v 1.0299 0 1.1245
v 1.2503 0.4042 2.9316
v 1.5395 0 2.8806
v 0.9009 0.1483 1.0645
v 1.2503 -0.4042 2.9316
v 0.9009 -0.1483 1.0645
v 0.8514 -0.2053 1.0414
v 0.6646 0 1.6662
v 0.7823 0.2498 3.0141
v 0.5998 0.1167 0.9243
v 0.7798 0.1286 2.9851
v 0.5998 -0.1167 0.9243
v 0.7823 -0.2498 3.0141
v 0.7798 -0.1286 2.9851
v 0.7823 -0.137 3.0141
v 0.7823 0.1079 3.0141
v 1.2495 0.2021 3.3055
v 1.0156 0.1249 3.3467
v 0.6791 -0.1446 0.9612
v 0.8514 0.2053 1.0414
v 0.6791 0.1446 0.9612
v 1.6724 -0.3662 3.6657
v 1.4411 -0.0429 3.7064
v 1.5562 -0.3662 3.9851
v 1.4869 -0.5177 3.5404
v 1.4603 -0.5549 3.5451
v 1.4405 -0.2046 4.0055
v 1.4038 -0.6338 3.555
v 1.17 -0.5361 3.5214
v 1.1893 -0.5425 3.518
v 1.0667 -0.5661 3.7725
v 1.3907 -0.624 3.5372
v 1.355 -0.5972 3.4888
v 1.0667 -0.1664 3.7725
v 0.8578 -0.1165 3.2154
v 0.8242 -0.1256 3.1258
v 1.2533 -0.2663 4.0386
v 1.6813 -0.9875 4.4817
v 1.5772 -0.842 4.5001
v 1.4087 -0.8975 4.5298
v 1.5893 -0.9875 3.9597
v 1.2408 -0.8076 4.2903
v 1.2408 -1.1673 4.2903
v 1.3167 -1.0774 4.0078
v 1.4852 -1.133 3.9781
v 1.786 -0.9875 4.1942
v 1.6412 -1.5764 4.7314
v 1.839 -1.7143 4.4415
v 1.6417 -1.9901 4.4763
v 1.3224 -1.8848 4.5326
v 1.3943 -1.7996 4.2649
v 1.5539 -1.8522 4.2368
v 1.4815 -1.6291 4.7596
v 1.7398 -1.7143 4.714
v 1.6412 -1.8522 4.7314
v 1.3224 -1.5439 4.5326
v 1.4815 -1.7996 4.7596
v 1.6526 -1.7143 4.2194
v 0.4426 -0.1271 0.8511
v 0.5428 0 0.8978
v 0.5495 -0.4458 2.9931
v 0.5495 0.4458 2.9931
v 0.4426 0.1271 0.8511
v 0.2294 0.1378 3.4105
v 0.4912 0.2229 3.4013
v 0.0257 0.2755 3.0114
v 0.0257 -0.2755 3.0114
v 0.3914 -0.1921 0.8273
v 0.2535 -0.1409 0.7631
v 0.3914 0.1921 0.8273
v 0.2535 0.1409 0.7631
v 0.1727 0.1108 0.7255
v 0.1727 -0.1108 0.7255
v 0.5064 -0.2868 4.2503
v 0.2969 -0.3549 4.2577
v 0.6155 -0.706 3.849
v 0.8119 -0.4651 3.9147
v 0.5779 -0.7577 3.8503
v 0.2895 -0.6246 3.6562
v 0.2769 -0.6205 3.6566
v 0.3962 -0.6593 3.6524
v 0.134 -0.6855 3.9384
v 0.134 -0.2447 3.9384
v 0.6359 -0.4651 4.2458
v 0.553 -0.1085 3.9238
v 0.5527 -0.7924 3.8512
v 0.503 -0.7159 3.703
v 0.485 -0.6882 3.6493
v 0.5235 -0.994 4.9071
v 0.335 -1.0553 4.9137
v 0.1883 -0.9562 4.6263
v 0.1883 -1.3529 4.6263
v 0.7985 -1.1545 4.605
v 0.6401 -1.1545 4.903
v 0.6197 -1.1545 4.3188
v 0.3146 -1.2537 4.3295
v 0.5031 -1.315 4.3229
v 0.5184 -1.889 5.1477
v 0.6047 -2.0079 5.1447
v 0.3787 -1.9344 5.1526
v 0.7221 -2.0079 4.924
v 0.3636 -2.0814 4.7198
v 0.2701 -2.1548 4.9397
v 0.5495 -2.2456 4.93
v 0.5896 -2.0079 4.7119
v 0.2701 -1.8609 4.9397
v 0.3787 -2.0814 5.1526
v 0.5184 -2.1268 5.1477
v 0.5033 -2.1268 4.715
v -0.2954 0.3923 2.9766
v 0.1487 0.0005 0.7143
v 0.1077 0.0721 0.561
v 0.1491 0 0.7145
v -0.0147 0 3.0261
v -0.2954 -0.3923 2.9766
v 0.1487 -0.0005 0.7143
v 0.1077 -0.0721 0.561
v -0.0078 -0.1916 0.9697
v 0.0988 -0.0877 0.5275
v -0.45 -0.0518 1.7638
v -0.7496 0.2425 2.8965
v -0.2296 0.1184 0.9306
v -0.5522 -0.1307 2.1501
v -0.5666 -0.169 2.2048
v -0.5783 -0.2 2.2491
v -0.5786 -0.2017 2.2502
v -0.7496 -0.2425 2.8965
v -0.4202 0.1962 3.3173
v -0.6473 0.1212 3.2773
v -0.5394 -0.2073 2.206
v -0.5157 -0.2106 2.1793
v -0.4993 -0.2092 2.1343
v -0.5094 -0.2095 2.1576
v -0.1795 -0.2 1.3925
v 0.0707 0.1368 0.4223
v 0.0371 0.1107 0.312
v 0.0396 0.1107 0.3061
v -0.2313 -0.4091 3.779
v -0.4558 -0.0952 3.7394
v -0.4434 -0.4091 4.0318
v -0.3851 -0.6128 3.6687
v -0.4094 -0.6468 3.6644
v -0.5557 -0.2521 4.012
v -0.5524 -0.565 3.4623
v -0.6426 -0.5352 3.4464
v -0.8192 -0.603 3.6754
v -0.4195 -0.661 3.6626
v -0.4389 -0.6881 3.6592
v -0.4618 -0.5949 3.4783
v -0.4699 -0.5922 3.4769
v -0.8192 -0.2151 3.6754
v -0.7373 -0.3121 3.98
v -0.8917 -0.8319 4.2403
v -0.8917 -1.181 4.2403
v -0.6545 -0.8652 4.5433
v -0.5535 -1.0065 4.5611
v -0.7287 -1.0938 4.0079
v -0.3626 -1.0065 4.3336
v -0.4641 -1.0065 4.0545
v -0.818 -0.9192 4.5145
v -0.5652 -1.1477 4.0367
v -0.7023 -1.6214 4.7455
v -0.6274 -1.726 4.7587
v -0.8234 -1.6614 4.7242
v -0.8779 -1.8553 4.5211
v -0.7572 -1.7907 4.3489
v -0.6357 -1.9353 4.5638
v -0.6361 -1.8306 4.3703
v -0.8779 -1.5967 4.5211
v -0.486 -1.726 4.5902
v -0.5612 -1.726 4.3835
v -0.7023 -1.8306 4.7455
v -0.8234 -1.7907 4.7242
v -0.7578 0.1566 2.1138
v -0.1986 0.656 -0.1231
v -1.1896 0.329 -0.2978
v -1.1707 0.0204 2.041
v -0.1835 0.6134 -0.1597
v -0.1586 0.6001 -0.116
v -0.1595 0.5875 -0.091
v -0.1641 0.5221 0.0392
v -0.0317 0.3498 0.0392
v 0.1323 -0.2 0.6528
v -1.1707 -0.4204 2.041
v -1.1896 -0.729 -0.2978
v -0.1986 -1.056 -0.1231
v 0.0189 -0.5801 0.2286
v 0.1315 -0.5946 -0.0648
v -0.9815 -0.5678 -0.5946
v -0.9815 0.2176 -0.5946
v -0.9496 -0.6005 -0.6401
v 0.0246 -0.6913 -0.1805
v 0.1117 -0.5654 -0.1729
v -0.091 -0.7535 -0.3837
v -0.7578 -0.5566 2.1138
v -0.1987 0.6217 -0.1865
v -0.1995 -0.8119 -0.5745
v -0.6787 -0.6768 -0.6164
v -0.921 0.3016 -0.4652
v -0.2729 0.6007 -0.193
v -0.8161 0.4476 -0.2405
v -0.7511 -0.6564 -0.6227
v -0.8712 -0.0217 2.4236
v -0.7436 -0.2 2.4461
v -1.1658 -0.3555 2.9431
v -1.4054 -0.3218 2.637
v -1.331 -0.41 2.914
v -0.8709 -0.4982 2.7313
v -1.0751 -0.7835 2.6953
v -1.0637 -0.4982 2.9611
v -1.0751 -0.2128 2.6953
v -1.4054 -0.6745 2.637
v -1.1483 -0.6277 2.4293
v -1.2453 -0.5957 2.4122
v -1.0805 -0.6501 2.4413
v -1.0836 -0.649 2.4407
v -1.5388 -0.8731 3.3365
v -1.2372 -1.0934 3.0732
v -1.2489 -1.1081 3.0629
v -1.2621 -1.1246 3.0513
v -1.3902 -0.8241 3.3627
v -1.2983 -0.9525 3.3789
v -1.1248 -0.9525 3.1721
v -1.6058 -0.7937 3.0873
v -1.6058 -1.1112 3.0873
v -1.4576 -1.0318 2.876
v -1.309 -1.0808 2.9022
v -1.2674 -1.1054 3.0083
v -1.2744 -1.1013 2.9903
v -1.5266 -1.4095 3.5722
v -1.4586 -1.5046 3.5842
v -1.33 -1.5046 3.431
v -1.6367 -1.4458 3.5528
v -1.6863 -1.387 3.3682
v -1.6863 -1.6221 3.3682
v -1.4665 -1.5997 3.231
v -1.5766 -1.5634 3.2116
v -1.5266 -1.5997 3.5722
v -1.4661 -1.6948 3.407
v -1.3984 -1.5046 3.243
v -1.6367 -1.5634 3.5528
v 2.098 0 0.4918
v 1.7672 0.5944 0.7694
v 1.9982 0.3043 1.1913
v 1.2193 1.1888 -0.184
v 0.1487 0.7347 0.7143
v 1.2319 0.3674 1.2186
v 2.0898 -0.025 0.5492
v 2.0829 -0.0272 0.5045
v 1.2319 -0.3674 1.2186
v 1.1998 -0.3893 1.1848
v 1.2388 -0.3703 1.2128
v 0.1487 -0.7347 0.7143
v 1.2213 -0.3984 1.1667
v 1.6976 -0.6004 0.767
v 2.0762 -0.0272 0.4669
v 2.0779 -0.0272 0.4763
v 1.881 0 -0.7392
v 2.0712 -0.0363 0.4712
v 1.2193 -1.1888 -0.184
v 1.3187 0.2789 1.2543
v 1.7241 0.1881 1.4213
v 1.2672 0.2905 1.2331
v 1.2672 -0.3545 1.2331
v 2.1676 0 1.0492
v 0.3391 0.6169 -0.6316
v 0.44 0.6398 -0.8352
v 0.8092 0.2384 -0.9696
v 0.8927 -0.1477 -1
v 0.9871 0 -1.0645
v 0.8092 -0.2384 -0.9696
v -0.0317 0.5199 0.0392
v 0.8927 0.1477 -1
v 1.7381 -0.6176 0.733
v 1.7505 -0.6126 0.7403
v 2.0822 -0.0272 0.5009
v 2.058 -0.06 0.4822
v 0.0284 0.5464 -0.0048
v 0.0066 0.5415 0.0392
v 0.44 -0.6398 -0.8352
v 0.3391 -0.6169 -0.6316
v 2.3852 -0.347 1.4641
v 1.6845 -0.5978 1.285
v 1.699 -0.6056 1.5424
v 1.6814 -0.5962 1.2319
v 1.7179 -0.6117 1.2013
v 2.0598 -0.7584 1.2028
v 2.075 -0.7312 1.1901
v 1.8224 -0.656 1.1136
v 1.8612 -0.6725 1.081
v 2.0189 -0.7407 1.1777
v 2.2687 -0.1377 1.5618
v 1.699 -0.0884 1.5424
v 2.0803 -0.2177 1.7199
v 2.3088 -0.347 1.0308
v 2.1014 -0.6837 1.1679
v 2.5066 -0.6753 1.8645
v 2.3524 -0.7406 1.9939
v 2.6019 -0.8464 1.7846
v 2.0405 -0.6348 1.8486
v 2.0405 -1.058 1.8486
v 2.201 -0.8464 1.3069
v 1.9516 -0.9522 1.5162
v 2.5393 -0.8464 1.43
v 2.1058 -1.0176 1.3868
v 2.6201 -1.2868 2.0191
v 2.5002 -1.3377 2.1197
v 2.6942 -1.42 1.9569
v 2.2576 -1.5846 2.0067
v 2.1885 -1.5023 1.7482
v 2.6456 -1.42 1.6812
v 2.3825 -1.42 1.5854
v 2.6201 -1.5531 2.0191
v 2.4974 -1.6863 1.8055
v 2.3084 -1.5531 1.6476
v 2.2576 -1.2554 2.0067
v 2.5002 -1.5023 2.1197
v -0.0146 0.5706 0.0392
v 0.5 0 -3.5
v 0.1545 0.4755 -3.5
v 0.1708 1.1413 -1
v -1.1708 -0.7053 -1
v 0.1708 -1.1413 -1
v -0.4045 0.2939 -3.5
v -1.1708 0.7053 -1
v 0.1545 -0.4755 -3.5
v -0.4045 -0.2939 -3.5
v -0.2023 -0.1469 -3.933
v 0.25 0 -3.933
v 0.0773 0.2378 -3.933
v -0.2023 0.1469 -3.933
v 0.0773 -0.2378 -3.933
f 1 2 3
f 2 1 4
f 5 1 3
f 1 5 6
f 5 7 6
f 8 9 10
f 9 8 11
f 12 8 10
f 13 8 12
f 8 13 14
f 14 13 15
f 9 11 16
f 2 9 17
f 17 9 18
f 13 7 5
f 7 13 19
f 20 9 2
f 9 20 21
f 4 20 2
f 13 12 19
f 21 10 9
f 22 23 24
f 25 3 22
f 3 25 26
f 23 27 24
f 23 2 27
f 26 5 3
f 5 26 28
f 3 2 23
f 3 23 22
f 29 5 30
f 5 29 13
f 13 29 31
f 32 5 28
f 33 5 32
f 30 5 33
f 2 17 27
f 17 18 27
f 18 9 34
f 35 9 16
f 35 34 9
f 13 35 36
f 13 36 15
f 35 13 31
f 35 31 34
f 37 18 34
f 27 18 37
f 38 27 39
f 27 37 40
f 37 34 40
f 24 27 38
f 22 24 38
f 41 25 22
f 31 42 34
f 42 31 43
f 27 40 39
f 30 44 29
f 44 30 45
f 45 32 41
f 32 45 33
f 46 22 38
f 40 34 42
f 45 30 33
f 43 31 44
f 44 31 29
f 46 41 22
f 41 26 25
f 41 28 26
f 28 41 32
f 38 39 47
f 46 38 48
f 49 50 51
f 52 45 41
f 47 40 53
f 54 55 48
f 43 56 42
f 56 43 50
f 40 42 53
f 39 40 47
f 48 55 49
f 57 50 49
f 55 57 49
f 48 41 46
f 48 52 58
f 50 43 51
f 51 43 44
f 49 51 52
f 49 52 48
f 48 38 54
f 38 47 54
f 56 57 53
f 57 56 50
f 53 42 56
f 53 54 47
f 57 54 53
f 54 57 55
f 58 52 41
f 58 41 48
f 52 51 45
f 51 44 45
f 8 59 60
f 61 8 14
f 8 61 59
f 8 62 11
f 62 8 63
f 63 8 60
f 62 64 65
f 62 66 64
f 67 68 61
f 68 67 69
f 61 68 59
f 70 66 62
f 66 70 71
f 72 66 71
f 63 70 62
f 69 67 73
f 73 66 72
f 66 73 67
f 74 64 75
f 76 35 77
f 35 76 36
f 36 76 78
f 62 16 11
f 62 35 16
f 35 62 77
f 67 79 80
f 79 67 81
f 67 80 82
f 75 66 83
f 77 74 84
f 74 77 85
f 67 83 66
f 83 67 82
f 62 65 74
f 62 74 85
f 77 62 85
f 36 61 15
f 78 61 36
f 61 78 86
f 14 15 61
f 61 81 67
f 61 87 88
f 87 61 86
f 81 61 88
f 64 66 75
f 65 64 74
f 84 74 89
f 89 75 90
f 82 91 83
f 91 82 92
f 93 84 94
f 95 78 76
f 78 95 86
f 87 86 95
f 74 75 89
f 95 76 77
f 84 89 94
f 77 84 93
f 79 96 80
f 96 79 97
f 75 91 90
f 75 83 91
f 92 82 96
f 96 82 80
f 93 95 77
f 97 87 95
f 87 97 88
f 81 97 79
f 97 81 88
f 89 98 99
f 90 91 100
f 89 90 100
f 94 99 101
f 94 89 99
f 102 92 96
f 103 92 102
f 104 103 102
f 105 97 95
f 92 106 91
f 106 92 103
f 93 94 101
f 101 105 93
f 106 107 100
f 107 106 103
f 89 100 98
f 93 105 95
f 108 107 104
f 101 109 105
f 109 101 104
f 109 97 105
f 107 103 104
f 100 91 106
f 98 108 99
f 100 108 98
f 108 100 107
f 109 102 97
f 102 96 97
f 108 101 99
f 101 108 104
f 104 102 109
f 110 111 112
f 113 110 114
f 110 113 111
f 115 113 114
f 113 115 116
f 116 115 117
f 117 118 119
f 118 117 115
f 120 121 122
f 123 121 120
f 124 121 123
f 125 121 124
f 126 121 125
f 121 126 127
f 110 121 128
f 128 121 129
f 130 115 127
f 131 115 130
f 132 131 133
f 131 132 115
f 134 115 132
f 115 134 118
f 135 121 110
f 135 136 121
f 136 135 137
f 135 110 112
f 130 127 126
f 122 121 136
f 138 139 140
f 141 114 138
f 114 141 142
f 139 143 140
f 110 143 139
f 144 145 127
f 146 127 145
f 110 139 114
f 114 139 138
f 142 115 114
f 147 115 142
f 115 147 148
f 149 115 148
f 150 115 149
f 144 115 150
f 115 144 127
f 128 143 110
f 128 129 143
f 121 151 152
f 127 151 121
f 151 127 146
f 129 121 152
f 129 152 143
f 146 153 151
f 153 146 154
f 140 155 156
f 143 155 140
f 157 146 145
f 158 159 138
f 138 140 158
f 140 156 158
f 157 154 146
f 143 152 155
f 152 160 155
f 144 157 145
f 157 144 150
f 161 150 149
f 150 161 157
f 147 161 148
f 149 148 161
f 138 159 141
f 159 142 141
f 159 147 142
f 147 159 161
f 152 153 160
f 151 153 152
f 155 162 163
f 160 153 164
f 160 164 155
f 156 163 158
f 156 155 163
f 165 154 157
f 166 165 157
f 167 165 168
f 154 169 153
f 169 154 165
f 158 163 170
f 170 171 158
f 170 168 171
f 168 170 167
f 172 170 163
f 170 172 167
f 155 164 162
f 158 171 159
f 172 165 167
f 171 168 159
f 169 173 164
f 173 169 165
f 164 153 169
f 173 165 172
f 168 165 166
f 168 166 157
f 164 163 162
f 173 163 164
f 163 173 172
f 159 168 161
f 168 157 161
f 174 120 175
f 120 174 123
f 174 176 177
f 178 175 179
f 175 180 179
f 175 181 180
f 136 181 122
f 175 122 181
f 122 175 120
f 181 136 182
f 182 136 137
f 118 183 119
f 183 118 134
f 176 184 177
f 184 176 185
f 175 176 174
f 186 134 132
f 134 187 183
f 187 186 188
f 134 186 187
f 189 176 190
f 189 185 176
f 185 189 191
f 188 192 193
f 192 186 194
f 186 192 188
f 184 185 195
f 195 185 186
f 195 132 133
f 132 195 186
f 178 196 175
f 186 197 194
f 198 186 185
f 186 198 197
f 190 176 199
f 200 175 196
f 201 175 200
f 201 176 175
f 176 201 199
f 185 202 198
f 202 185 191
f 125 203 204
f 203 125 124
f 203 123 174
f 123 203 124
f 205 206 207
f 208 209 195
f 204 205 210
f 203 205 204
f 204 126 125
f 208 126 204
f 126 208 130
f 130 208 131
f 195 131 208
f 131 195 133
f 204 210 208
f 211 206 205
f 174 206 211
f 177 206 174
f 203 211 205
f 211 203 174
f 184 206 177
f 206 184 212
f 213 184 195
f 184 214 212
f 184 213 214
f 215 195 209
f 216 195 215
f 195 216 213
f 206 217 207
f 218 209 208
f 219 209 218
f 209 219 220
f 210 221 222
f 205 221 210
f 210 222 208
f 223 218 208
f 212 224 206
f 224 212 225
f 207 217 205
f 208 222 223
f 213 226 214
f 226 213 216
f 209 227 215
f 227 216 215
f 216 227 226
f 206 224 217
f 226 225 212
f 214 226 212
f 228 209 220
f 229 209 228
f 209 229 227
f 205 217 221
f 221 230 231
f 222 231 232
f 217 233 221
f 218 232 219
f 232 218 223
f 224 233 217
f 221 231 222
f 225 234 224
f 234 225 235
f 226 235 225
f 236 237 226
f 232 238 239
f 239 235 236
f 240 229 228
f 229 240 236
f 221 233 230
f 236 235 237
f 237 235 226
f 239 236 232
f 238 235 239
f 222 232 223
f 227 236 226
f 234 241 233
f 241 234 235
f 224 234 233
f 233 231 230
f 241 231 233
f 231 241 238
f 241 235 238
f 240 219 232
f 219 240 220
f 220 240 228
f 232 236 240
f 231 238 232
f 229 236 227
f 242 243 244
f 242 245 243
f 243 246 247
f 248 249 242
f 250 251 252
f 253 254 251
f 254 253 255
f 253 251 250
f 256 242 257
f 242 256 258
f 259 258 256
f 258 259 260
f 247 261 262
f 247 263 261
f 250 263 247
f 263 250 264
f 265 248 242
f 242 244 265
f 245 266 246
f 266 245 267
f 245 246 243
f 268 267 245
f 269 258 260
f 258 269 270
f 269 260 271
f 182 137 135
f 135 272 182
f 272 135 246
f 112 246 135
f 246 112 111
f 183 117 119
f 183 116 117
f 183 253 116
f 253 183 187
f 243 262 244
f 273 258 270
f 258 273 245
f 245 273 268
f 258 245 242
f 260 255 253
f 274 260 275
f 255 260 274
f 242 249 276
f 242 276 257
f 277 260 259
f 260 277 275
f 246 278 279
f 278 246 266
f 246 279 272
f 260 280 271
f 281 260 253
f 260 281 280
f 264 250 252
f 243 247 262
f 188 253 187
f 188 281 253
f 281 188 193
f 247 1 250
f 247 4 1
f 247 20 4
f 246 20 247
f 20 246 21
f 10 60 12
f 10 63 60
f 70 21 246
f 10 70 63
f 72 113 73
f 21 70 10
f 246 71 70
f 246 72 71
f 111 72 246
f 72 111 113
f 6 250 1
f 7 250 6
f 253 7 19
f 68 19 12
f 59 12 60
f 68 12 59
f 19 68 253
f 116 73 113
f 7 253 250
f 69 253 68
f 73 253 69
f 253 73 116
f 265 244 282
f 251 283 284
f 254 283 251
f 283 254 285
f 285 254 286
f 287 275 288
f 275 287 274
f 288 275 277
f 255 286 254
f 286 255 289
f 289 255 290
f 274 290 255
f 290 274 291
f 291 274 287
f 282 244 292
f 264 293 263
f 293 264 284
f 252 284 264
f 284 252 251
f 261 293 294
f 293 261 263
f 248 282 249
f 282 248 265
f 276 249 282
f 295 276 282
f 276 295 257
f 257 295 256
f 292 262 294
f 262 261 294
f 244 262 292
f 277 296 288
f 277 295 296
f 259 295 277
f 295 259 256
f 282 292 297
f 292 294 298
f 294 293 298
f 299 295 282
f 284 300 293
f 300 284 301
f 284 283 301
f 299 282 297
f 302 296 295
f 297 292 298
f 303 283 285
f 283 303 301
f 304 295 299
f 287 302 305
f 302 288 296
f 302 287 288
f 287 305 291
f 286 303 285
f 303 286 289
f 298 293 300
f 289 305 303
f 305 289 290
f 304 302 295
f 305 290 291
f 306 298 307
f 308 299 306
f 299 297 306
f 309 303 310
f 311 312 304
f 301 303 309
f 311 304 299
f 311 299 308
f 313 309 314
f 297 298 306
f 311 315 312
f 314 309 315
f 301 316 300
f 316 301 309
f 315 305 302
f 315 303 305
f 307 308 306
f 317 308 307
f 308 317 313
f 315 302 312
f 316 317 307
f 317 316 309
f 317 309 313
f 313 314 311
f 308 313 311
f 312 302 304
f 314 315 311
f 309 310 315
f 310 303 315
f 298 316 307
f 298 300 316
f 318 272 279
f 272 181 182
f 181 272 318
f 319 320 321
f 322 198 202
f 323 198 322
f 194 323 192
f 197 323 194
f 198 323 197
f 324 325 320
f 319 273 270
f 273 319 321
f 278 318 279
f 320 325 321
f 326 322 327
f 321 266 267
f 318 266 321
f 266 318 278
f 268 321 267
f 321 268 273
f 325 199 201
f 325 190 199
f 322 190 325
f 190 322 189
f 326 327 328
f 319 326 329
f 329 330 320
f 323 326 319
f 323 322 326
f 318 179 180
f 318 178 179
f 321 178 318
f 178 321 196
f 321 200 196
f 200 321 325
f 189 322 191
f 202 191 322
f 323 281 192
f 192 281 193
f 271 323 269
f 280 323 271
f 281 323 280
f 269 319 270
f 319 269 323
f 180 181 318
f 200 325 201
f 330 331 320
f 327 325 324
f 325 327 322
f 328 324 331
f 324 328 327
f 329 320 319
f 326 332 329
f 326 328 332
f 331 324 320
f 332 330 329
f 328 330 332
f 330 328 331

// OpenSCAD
 




 f1A =[0,0,0,0.1];
 f1B =[0,0,3,0.425];
 f1C =[0.07961927,-0.3662486,3.796193,0.34];
 f1D =[0.1336378,-0.9874623,4.336379,0.306];
 f1E =[0.1589203,-1.714333,4.589203,0.29];
 f1Quat =[-0.01375867,-0.1100694,0.06879336,0.9914449];
 f1Lengths =[3,0.88,0.8250002,0.7699998];
 

 f2A =[0,0,0,0.1];
 f2B =[0,0,3,0.46875];
 f2C =[0,-0.4651021,3.930204,0.375];
 f2D =[0,-1.154531,4.619634,0.3375];
 f2E =[0,-2.007883,4.93569,0.25];
 f2Quat =[-0.002759293,-0.02207434,0.01379647,0.9996573];
 f2Lengths =[3,1.04,0.9750001,0.91];

 

 f3A =[0,0,0,0.1];
 f3B =[0,0,3,0.4125];
 f3C =[0,-0.4090538,3.77915,0.33];
 f3D =[0,-1.006468,4.348116,0.297];
 f3E =[0,-1.726023,4.622232,0.22];
 f3Quat =[0.009187022,0.07349618,-0.04593511,0.9961947];
 f3Lengths =[3,0.8800001,0.8250002,0.77];

 

 f4A =[0.2,-0.5,0.4,0.9];
 f4B =[0.2,-0.5,2.7,0.375];
 f4C =[0.01168381,-0.7981673,3.327721,0.3];
 f4D =[-0.1317746,-1.252452,3.805915,0.27];
 f4E =[-0.2189538,-1.804587,4.096512,0.2];
 f4Quat =[0.05904933,0.2361973,-0.2952467,0.9238795];
 f4Lengths =[2.3,0.7199999,0.675,0.63];

 

 f5A =[-0.1,0,0,1.25];
 f5B =[-0.1,0,1,0.64];
 f5C =[-0.1,-0.3469815,1.630875,0.44];
 f5D =[-0.1,-0.846441,2.08493,0.36];
 f5E =[-0.1,-1.419972,2.345625,0.28];
 f5Quat =[0.112371,-0.7491399,0.5993119,0.2588191];
 f5Lengths =[1,0.72,0.6750001,0.6299999];

arm=[[-0.2, 0.0, -1.0,1.2 ], [0.0, 0.0, -3.5,.5 ]]; 

polyline(arm); 
translate([0.6,0,0])rotate( 10,[0,1,0])polyline(f1); 
translate([0.3,0,0])rotate( 2,[0,1,0])polyline(f2); 
translate([0.1,0,0])rotate( -10,[0,1,0])polyline(f3); 
translate([-0.6,0.30,-0.6])rotate( -10,[0,1,0])polyline(f4); 

translate([1,0,0])rotate( 40,[0,1,0])polyline(f5); 
f1=[f1A,f1B,f1C,f1D,f1E];
f2=[f2A,f2B,f2C,f2D,f2E];
f3=[f3A,f3B,f3C,f3D,f3E];
f4=[f4A,f4B,f4C,f4D,f4E];
f5=[f5A,f5B,f5C,f5D,f5E];


  
 module polyline(p) {for(i=[0:max(0,len(p)-2)])line(p[i],p[wrap(i+1,len(p)  )]);
} // polyline plotter
module line(p1, p2 ,width=0.5) 
{ // single line plotter
    hull() {
        translate(v3(p1)) sphere(p1[3]);
        translate(v3(p2)) sphere(p2[3]);
    }
}
function wrap(x,x_max=1,x_min=0) = (((x - x_min) % (x_max - x_min)) + (x_max - x_min)) % (x_max - x_min) + x_min; // wraps numbers inside boundaries



function v3(v)=[v.x,v.y,v.z];
